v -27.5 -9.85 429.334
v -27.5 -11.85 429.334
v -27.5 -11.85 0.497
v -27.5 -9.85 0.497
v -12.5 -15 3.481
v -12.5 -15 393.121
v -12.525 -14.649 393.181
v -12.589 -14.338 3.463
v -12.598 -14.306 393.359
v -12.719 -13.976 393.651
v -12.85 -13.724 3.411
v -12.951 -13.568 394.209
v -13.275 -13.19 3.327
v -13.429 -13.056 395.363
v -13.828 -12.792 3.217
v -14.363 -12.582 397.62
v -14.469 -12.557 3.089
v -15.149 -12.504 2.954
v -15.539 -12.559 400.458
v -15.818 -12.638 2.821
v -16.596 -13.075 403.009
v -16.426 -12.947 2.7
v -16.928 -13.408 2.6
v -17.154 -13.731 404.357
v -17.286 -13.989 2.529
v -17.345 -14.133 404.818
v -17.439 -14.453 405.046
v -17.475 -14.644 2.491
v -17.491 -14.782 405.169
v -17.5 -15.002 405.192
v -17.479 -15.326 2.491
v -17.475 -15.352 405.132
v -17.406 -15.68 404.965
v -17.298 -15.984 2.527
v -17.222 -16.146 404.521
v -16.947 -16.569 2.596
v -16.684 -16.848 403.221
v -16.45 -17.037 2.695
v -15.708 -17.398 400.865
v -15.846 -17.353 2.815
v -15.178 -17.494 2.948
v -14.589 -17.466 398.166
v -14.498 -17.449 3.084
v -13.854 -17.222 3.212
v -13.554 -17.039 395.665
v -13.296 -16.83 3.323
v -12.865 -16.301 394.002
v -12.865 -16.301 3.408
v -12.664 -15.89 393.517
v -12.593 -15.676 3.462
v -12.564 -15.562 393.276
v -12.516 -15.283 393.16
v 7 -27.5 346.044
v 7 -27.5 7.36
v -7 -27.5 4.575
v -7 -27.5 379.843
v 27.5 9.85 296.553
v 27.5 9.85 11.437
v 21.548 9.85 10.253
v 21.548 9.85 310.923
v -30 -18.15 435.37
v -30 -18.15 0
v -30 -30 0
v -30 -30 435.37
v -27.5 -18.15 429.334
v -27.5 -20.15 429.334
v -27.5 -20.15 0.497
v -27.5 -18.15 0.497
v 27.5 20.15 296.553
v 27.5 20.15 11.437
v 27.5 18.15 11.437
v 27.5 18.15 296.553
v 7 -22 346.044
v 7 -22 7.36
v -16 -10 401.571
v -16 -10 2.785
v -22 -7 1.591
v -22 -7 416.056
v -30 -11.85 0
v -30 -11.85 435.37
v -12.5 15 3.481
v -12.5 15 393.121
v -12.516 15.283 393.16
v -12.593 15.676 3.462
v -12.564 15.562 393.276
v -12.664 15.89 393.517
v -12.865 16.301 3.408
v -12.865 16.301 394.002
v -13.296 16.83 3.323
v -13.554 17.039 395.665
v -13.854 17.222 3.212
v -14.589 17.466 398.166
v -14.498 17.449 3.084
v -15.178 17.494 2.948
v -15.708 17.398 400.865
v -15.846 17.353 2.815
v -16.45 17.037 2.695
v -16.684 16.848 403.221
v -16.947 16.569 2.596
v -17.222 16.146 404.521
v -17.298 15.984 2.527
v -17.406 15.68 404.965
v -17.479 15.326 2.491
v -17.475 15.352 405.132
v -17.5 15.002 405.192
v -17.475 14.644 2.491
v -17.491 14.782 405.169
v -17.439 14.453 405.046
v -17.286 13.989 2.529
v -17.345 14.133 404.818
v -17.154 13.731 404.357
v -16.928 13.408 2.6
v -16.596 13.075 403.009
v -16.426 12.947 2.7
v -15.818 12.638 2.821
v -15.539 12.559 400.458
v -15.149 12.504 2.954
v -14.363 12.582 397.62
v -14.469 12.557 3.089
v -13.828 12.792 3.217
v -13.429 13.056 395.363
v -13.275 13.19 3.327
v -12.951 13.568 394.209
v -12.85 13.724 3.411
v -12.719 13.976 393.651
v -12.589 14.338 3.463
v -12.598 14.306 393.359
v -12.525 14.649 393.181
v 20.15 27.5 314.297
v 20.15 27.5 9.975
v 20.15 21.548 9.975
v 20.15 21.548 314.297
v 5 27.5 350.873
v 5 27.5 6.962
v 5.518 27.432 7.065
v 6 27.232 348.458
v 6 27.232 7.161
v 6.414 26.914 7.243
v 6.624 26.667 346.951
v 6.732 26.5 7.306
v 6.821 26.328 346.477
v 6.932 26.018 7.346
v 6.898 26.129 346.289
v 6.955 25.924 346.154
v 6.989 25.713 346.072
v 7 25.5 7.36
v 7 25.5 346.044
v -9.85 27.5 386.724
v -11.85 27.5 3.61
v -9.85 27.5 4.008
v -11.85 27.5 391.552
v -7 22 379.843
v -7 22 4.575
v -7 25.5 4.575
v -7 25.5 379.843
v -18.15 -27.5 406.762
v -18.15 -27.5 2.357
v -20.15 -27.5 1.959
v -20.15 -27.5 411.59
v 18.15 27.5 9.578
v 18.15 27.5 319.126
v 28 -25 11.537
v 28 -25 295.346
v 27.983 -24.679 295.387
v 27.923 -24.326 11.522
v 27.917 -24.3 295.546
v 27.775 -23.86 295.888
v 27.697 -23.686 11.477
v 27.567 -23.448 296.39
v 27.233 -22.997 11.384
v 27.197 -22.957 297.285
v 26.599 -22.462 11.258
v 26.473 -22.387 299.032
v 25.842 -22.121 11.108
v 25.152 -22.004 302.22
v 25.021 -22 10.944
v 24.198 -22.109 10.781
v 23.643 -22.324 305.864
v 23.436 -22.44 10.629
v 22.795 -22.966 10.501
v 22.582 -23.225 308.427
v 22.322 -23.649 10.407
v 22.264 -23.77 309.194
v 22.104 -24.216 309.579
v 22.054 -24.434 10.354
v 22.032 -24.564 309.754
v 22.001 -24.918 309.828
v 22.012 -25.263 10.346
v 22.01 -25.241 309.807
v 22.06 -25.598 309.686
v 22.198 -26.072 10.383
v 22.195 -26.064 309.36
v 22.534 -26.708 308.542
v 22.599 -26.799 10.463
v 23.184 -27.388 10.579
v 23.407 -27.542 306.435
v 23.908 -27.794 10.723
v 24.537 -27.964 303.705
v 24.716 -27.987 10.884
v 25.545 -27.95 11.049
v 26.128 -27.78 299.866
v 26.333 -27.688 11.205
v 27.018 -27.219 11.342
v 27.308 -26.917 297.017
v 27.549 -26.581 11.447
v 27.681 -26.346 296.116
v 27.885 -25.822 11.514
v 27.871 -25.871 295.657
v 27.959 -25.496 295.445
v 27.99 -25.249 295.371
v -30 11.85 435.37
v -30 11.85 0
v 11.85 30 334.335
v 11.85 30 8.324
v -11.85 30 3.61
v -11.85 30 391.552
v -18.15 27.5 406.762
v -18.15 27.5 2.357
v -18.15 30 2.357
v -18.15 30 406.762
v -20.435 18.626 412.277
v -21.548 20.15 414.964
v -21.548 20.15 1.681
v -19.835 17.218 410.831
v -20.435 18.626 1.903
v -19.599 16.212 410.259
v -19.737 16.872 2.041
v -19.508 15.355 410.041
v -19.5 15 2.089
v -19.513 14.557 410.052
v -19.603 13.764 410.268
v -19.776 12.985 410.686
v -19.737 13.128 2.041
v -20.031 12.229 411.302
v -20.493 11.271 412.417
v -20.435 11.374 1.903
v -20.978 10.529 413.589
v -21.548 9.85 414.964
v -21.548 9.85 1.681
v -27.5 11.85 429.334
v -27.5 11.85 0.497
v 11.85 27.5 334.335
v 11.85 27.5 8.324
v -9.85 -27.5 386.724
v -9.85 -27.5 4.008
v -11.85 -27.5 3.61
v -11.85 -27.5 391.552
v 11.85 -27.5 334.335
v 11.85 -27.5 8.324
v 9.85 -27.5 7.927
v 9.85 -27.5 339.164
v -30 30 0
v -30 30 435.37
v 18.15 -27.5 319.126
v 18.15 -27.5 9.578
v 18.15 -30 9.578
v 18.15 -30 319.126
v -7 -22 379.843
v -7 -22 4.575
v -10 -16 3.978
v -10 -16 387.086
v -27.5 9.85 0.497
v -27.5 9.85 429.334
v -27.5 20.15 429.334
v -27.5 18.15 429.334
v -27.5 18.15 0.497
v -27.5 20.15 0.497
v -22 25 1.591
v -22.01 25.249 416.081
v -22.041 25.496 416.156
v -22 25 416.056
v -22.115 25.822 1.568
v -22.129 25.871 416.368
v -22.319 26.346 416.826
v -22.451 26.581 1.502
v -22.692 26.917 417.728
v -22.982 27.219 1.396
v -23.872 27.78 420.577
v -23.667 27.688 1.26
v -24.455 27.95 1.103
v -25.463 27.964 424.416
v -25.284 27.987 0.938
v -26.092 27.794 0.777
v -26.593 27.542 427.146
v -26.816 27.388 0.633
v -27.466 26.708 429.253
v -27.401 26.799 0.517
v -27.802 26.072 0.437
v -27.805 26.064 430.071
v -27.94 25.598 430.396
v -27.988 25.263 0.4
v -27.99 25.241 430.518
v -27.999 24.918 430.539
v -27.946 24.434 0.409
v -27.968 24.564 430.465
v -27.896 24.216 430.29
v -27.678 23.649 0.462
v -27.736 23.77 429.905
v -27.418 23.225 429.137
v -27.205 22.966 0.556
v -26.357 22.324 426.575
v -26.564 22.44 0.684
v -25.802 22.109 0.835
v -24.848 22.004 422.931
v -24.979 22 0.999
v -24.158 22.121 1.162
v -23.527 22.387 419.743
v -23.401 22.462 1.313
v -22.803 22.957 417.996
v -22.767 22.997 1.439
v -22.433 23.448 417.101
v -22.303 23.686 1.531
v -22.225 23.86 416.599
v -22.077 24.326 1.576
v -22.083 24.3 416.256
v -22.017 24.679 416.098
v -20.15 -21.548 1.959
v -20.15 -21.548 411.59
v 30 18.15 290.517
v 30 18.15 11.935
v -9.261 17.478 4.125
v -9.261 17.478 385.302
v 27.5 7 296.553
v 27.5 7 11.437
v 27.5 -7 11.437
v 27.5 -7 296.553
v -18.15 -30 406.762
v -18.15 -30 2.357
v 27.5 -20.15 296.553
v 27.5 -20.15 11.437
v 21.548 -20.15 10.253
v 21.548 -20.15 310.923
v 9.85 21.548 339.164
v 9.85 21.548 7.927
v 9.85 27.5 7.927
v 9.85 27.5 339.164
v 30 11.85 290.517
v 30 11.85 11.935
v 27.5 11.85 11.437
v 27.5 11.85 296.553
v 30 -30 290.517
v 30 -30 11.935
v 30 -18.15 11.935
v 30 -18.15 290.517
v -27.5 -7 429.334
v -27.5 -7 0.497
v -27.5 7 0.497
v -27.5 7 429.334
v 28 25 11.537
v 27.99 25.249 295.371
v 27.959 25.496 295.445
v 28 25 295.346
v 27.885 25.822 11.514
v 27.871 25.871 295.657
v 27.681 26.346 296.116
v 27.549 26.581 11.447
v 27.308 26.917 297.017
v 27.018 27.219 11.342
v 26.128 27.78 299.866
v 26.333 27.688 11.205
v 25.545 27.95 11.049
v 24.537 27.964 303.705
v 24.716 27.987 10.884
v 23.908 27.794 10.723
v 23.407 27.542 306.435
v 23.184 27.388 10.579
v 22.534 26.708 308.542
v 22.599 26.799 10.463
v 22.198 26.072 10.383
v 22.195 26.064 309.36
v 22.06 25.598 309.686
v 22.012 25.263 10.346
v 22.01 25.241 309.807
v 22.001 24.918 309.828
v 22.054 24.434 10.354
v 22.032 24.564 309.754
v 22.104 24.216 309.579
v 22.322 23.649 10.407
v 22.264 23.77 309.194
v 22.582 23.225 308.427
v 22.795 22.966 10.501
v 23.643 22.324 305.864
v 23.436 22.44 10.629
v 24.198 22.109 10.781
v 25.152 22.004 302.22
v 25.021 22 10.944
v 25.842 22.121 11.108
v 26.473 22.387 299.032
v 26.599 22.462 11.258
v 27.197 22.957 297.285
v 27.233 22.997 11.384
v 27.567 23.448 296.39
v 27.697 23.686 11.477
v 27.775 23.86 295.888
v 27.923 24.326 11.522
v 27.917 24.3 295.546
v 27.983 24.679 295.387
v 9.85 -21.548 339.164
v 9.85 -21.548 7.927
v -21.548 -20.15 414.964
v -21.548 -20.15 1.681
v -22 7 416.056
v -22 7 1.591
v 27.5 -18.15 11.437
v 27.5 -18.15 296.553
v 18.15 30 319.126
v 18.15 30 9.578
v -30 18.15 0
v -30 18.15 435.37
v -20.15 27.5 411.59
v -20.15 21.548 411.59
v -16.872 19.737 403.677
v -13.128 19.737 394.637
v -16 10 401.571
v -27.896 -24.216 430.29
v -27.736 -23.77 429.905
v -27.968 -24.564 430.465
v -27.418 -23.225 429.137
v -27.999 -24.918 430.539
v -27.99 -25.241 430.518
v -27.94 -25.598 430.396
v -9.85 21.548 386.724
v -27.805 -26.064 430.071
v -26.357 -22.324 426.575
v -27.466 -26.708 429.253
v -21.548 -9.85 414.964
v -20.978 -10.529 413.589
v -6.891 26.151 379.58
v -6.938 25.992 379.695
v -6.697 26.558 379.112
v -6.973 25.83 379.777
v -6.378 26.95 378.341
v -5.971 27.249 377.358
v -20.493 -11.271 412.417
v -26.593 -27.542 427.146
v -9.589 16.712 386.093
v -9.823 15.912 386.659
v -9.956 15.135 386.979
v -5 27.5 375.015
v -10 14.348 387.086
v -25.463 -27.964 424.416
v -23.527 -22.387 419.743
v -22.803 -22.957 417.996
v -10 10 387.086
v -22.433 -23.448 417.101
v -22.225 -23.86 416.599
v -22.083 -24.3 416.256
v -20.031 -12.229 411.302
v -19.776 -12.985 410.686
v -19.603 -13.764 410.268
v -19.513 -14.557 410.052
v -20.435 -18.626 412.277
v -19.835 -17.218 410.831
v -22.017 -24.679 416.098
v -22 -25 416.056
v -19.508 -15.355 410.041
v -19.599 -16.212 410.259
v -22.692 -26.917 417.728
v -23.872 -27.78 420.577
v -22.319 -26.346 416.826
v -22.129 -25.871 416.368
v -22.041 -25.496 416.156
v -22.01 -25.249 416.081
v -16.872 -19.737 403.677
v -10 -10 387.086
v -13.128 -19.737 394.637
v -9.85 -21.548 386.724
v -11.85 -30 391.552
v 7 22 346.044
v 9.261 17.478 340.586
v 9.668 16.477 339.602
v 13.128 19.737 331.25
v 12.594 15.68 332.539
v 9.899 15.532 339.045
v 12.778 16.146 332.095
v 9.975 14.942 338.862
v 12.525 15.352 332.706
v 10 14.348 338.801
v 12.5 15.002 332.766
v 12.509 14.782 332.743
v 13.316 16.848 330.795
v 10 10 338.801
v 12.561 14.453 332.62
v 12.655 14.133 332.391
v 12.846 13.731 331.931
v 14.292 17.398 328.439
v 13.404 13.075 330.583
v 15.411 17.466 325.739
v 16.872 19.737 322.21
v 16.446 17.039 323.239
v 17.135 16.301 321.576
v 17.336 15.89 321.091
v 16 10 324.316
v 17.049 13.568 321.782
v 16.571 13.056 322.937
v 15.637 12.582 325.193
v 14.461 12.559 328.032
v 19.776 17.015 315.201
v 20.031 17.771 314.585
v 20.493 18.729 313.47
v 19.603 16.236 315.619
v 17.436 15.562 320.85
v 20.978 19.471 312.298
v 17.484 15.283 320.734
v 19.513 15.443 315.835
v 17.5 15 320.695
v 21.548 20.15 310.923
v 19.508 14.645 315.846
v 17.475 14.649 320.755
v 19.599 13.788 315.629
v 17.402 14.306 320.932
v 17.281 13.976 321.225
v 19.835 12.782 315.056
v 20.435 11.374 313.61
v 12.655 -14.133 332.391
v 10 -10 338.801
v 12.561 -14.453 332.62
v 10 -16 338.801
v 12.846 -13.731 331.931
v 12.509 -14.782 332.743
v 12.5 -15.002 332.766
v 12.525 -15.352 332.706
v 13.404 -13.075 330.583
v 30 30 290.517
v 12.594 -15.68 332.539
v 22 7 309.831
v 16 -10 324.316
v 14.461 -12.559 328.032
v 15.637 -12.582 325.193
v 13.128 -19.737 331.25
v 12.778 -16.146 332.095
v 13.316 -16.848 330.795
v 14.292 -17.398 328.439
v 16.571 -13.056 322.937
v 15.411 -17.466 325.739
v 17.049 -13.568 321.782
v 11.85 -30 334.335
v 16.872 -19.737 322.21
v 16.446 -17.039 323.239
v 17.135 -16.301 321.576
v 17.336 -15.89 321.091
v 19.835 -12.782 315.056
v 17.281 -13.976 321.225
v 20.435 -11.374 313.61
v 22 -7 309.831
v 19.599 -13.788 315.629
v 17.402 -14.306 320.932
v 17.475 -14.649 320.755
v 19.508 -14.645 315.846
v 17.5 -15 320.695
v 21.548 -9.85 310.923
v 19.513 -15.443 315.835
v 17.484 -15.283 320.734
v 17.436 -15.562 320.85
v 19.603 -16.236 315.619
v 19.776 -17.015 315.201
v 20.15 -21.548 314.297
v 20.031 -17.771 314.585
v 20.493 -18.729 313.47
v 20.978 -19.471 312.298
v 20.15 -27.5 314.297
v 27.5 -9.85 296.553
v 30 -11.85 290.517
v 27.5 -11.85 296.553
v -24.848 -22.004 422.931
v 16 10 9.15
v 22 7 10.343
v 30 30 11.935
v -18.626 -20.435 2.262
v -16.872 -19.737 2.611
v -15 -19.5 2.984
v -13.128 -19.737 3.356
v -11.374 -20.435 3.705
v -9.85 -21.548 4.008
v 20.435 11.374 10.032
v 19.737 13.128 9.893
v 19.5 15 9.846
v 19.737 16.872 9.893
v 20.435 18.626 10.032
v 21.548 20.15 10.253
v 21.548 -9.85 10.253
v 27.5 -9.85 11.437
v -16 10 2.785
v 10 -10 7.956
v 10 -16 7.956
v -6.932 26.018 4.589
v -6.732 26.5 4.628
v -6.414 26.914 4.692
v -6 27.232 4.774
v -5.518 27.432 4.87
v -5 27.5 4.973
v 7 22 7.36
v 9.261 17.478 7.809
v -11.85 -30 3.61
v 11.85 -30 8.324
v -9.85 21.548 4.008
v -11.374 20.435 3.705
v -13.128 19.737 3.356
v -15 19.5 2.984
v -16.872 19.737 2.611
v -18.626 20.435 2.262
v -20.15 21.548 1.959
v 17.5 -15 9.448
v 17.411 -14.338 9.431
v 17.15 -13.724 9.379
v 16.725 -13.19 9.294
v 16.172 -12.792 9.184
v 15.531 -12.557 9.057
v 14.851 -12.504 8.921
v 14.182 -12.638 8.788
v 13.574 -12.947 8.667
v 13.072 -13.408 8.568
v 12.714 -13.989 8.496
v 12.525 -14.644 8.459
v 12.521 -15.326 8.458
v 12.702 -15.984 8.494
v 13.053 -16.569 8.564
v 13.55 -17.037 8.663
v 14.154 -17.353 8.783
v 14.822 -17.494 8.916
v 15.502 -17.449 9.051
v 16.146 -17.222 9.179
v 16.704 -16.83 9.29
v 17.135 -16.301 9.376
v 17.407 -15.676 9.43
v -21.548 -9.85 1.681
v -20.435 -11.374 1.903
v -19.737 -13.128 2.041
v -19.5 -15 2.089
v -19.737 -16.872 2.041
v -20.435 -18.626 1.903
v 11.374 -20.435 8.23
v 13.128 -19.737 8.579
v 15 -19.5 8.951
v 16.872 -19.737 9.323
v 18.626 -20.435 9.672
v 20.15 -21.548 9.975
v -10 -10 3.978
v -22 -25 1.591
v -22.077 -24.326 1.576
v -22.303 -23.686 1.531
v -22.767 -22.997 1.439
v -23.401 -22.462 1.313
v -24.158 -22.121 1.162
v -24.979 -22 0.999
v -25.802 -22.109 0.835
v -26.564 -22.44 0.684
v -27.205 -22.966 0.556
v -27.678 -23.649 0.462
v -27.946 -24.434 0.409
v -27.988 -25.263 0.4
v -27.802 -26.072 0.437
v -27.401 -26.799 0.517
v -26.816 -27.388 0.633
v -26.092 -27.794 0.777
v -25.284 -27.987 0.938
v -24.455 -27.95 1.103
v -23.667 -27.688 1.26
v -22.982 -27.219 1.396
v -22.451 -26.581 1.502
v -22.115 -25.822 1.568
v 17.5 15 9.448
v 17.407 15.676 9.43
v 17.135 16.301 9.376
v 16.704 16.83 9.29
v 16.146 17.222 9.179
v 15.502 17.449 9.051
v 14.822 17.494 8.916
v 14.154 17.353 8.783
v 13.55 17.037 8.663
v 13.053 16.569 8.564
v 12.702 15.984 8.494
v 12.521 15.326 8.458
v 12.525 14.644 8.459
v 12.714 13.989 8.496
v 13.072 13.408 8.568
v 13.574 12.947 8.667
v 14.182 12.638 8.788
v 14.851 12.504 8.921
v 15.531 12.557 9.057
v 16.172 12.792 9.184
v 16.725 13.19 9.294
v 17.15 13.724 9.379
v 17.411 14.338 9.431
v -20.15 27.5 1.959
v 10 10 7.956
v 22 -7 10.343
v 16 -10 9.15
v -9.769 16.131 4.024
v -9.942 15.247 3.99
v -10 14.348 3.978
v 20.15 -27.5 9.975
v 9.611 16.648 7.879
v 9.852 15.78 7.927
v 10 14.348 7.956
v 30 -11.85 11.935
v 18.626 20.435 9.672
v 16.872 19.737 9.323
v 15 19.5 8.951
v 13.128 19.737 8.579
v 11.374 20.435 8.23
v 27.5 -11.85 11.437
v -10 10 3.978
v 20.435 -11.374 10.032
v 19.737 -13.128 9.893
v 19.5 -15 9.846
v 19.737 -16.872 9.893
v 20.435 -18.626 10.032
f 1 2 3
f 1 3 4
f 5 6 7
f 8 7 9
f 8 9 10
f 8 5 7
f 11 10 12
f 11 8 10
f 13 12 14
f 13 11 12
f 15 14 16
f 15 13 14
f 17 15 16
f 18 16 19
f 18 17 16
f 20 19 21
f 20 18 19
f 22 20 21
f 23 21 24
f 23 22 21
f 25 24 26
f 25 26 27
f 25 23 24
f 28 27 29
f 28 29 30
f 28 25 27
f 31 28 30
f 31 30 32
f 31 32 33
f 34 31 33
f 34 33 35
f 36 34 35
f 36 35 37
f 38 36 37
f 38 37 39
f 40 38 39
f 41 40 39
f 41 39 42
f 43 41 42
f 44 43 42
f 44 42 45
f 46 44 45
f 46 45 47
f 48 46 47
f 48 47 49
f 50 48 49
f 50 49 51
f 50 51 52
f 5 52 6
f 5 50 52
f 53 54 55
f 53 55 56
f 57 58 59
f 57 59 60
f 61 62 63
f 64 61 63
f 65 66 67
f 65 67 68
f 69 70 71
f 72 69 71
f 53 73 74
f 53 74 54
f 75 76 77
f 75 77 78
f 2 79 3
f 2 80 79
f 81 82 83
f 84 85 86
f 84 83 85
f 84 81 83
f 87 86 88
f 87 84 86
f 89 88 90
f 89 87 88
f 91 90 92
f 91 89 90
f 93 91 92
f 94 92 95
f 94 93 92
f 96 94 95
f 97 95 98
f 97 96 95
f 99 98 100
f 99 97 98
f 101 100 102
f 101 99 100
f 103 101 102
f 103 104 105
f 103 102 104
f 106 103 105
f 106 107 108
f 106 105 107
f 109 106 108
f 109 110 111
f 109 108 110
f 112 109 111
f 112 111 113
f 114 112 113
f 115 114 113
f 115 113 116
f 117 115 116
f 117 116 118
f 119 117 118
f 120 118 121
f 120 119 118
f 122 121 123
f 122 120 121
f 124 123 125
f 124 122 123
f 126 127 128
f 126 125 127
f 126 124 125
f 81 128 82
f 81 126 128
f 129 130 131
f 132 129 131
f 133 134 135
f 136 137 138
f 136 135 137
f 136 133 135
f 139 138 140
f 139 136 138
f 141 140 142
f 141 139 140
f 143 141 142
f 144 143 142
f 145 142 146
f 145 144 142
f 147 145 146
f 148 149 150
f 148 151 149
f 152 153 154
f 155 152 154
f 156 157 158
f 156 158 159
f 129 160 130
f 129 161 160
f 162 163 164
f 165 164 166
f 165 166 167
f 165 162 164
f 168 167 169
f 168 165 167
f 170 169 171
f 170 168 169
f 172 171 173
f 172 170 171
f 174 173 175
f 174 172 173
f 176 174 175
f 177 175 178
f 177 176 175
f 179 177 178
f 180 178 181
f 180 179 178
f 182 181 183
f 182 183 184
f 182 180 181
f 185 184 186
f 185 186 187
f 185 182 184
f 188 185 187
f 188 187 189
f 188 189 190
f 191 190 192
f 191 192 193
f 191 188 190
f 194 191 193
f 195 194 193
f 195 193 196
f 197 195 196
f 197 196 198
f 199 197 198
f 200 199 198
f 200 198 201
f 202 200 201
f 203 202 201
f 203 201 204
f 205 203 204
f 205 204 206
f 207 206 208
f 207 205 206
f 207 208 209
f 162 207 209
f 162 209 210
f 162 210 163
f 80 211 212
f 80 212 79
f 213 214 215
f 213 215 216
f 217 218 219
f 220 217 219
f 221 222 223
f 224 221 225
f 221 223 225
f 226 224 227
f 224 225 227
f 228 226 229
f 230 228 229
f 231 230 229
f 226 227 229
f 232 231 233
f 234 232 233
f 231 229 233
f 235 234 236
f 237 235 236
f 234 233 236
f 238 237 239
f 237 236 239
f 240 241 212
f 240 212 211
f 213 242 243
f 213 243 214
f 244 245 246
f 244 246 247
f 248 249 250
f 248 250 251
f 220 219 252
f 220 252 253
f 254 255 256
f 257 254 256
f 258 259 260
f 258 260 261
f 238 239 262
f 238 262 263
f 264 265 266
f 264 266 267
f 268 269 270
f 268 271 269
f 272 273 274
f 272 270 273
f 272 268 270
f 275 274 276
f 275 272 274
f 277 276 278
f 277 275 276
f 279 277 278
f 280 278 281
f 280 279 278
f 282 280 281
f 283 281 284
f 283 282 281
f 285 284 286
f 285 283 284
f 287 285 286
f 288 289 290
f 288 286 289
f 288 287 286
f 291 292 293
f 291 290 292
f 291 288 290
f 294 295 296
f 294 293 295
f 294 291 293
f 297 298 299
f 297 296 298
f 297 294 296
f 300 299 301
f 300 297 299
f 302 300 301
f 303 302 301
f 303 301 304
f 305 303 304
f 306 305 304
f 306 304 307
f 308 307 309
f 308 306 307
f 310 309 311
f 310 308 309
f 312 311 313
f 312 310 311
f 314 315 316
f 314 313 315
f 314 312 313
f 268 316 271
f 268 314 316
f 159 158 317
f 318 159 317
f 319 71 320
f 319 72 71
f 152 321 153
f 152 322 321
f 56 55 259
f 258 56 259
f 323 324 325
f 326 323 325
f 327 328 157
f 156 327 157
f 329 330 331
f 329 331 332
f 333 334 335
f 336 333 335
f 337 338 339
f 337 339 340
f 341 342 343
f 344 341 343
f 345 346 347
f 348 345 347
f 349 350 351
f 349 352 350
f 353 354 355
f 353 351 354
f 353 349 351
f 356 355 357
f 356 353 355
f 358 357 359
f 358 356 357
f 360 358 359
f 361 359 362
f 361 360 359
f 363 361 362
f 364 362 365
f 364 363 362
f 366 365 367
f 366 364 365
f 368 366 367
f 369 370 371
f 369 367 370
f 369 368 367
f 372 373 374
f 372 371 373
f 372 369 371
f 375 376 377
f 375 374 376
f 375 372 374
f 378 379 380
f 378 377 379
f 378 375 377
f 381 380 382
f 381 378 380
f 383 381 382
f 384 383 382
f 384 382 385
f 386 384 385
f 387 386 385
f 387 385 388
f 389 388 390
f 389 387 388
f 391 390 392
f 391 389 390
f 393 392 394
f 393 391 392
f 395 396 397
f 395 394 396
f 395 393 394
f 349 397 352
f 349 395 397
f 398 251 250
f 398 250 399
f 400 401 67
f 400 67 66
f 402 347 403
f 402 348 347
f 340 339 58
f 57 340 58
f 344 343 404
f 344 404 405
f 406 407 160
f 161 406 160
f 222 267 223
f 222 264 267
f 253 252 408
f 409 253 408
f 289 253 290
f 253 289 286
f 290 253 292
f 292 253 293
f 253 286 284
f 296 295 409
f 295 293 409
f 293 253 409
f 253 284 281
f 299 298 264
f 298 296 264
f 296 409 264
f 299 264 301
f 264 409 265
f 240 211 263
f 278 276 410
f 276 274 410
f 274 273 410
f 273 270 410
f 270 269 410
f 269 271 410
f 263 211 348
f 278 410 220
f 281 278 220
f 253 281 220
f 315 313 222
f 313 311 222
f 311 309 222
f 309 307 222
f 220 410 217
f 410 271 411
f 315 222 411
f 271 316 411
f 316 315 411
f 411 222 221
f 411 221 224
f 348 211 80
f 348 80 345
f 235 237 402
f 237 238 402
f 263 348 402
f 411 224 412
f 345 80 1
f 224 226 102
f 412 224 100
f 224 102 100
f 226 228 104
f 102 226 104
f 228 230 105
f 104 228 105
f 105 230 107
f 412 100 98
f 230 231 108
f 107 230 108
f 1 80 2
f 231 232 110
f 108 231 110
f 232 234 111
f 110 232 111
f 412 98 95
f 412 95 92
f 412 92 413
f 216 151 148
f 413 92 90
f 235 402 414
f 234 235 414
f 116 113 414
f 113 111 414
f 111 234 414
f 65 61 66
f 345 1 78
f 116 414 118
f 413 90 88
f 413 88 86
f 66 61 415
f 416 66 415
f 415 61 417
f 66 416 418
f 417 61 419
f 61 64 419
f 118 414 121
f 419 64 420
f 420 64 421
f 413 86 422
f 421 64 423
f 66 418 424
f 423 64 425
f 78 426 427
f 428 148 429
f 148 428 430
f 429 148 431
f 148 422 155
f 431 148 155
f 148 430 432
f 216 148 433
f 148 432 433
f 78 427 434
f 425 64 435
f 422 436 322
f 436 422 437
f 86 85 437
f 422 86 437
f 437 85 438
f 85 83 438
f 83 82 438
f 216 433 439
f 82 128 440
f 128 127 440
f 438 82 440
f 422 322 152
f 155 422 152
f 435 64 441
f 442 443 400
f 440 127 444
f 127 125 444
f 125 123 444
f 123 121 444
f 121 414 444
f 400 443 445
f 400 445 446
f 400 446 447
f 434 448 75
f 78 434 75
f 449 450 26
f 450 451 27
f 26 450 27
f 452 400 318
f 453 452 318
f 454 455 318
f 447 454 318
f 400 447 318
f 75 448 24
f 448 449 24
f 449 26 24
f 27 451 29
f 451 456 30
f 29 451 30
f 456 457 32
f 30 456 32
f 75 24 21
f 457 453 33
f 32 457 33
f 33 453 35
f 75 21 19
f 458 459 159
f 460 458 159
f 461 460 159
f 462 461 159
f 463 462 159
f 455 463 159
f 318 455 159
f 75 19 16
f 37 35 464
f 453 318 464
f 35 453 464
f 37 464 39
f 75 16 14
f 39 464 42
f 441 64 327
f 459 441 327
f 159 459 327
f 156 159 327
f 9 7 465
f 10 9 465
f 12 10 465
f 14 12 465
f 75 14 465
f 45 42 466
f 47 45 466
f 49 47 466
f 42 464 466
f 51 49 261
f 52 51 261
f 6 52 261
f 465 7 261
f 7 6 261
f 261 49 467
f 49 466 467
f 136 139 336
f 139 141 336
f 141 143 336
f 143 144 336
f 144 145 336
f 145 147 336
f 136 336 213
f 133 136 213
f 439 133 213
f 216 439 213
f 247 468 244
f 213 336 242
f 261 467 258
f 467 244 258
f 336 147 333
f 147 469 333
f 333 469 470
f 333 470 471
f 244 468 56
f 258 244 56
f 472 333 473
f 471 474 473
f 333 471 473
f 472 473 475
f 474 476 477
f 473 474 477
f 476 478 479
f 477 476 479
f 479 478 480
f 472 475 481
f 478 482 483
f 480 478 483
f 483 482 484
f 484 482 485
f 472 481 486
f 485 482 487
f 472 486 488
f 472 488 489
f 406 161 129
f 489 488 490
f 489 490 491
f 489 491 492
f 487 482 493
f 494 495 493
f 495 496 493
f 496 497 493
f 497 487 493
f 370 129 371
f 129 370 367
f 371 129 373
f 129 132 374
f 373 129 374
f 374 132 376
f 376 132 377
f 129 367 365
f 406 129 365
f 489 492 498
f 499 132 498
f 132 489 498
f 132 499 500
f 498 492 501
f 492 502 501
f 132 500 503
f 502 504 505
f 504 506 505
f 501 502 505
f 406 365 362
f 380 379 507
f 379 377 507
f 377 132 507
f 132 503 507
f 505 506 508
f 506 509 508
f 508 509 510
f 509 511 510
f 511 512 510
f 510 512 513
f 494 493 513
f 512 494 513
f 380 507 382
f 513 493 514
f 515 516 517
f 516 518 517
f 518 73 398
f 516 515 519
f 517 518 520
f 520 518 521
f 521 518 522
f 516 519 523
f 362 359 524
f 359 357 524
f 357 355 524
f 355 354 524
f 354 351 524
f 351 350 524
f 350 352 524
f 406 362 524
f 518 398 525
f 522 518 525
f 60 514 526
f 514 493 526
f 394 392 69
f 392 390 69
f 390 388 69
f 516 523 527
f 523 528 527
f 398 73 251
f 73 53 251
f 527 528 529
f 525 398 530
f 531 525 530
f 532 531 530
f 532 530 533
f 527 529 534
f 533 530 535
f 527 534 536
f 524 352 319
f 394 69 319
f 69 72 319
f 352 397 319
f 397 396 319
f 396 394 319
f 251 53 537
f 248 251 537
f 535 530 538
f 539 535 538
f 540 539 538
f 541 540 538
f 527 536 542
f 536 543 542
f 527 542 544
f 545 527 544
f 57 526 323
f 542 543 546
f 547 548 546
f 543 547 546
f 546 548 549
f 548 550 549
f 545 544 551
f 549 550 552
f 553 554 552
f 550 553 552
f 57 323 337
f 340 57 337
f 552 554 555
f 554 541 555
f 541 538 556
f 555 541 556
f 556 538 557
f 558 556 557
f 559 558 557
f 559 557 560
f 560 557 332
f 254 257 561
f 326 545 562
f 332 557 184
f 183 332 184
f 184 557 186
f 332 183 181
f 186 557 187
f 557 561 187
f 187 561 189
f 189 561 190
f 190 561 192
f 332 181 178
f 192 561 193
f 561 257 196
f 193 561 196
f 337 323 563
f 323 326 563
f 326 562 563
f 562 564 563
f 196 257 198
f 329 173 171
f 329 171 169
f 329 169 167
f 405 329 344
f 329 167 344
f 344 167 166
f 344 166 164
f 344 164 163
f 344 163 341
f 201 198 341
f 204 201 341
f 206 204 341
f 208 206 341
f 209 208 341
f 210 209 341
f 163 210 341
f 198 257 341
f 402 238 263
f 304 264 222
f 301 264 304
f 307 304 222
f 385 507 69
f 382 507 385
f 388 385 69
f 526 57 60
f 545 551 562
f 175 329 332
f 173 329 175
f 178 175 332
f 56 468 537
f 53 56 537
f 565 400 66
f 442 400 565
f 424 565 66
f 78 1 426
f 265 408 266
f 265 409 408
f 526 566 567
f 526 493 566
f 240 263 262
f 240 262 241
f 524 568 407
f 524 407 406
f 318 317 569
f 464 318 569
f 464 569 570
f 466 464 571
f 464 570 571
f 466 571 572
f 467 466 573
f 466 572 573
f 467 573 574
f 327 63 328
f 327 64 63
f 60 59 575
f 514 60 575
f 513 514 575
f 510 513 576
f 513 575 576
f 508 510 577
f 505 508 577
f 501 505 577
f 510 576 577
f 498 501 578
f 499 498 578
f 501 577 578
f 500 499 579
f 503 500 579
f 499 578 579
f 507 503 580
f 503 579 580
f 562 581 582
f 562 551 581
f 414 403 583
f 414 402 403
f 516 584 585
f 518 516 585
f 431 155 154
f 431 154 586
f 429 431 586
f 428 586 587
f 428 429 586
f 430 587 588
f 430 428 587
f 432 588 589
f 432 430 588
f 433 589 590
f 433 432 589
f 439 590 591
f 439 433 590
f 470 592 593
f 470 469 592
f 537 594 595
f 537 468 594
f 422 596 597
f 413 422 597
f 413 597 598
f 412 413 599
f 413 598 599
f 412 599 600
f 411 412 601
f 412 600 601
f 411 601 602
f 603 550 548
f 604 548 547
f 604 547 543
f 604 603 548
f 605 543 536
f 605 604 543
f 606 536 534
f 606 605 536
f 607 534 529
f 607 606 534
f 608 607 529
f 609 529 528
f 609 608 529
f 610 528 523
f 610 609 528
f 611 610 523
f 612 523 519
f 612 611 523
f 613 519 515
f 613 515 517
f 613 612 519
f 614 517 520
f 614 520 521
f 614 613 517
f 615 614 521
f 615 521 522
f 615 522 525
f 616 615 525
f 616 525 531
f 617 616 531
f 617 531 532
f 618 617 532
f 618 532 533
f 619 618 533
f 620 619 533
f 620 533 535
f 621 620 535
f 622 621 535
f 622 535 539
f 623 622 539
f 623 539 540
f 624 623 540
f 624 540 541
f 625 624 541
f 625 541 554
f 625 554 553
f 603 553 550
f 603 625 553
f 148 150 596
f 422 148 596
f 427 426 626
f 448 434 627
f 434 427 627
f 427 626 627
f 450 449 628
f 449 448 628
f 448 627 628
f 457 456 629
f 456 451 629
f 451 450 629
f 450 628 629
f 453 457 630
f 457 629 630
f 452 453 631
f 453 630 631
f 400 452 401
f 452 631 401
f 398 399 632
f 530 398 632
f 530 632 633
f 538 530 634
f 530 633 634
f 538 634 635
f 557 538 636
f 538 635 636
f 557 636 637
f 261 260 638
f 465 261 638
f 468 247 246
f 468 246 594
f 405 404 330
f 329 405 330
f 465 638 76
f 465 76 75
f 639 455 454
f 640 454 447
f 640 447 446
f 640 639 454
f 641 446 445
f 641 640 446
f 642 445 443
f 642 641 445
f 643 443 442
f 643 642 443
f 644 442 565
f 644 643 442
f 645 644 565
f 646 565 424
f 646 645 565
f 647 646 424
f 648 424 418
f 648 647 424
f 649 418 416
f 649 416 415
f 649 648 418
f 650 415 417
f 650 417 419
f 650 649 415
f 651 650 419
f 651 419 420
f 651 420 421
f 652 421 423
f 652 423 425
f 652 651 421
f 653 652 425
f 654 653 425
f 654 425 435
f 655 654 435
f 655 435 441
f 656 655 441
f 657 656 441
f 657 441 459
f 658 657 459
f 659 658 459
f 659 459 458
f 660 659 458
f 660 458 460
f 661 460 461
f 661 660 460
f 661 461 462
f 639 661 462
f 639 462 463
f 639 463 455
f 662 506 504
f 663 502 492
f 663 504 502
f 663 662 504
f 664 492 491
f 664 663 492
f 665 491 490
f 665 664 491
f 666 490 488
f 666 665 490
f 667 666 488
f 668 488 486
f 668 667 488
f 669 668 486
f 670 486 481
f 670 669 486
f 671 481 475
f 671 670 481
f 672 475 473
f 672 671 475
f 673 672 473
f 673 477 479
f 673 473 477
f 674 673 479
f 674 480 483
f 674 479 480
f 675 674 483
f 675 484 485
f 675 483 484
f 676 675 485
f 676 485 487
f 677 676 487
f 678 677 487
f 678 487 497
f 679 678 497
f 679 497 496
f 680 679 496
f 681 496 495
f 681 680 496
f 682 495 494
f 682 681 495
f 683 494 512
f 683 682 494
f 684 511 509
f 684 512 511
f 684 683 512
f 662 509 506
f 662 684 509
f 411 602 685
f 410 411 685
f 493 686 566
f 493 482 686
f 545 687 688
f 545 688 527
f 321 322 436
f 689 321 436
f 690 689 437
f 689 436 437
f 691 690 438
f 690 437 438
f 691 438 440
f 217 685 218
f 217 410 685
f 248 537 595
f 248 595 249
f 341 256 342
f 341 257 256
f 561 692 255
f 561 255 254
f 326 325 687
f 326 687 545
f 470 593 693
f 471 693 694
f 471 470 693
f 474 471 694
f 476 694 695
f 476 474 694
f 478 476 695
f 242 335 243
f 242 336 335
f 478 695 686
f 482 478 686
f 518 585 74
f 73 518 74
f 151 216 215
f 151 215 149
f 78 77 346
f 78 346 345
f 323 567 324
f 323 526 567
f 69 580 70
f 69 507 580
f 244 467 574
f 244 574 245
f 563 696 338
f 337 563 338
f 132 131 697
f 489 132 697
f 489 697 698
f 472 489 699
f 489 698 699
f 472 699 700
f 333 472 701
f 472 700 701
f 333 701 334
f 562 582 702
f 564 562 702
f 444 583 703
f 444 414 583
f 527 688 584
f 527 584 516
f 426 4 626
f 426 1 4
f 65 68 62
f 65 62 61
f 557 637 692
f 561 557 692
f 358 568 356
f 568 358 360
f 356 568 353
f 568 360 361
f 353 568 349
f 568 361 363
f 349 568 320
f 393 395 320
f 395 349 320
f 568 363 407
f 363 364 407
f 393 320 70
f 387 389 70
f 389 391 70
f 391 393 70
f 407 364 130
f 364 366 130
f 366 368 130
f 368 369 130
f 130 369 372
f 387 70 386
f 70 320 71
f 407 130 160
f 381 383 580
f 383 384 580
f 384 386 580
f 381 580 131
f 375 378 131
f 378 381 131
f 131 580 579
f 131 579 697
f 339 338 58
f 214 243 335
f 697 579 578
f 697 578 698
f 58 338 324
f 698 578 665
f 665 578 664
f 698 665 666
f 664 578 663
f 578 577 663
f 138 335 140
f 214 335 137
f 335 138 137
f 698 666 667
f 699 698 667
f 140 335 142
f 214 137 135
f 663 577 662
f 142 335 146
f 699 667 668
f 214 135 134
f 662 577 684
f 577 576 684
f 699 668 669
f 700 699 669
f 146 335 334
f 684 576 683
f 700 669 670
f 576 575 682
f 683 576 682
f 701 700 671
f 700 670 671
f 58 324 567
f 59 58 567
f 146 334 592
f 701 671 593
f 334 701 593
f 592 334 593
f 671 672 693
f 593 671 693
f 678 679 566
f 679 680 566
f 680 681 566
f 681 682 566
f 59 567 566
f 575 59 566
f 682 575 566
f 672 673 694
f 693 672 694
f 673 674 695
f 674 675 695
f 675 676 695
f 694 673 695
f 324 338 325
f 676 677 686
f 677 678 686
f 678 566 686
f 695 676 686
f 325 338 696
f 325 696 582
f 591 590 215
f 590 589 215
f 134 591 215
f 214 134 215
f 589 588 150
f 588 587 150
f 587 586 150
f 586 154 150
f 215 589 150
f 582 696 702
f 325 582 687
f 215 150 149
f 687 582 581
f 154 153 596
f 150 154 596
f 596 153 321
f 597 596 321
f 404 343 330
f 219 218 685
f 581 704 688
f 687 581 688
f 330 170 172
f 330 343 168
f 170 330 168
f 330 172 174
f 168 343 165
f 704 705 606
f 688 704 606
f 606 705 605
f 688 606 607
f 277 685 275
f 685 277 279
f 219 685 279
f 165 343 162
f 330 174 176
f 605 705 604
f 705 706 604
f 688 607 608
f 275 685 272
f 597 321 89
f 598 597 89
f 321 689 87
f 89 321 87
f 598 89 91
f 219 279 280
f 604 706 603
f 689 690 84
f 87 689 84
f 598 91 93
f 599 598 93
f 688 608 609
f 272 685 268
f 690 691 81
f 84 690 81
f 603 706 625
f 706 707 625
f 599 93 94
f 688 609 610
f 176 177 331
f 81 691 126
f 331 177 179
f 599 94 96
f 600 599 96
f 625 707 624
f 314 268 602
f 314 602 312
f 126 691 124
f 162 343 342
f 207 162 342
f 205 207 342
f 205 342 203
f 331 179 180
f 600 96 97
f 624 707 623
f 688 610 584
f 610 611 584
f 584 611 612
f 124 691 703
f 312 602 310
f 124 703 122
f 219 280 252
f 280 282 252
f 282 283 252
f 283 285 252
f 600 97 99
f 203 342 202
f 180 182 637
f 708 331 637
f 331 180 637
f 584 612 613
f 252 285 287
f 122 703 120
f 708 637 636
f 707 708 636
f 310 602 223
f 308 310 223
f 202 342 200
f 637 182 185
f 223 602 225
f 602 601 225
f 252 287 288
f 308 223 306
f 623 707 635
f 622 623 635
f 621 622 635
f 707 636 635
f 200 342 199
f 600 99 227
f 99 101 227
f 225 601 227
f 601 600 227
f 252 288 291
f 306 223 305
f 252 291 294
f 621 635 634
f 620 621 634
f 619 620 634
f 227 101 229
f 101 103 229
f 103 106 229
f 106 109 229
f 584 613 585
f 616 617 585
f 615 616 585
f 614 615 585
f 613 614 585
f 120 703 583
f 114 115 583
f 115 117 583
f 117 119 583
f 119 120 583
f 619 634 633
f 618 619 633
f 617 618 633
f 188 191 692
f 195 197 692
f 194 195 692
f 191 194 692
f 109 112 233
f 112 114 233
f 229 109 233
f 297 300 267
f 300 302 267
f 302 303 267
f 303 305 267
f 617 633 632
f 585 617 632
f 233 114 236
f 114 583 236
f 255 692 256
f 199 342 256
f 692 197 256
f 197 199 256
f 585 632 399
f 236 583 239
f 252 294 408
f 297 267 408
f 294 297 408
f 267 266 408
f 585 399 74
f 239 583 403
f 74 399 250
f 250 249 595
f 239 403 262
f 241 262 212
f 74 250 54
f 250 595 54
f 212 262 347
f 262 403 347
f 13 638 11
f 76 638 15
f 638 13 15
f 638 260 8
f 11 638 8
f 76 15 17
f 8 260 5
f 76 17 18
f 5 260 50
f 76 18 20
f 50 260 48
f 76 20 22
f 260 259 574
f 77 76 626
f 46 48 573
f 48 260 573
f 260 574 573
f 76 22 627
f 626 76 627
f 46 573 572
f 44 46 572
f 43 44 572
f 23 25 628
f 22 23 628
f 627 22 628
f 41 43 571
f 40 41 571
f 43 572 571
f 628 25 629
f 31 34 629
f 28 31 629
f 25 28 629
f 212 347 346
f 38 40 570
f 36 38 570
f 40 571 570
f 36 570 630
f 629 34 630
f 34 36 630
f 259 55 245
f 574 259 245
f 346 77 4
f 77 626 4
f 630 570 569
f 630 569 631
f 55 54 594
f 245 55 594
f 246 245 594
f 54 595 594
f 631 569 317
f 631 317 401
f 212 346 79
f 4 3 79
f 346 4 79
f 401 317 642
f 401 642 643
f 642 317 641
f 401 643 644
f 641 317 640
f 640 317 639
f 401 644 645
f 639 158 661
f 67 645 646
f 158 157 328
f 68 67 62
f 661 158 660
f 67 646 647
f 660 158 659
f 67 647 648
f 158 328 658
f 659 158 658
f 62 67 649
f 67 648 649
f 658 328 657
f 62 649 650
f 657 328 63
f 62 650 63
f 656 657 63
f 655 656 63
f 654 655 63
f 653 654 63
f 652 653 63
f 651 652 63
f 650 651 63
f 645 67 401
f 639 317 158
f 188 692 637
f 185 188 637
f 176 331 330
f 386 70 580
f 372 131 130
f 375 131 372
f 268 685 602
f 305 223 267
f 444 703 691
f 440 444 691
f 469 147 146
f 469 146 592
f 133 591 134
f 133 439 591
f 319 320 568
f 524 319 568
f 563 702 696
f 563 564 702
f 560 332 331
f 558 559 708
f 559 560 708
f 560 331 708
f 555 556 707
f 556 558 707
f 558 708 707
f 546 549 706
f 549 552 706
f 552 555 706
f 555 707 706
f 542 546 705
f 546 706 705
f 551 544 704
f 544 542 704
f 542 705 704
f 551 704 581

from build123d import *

# Parameters (mm, degrees)
F0_R          = 3
F0_R_2        = 2.5
F1_DEPTH      = 435.37
F2_R          = 2
F3_R          = 7
F5_DEPTH      = 30
F5_DEPTH_BACK = 30


# Not quite as in the source:
# - a feature names something its author has since deleted; it is built from what else it names


with BuildPart() as f1:
    # F0 (on Top) → F1 (new body)
    with BuildSketch(Plane.XY):
        with BuildLine():
            Line((18.15, -30), (30, -30))
            Line((30, -30), (30, -18.15))
            Line((30, -18.15), (27.5, -18.15))
            Line((27.5, -18.15), (27.5, -20.15))
            Line((27.5, -20.15), (21.5477069044, -20.15))
            ThreePointArc((21.5477069044, -20.15), (19.5, -15), (21.5477069044, -9.85))
            Line((21.5477069044, -9.85), (27.5, -9.85))
            Line((27.5, -9.85), (27.5, -11.85))
            Line((27.5, -11.85), (30, -11.85))
            Line((30, -11.85), (30, 11.85))
            Line((30, 11.85), (27.5, 11.85))
            Line((27.5, 11.85), (27.5, 9.85))
            Line((27.5, 9.85), (21.5477069044, 9.85))
            ThreePointArc((21.5477069044, 9.85), (19.5, 15), (21.5477069044, 20.15))
            Line((21.5477069044, 20.15), (27.5, 20.15))
            Line((27.5, 20.15), (27.5, 18.15))
            Line((27.5, 18.15), (30, 18.15))
            Line((30, 18.15), (30, 30))
            Line((30, 30), (18.15, 30))
            Line((18.15, 30), (18.15, 27.5))
            Line((18.15, 27.5), (20.15, 27.5))
            Line((20.15, 27.5), (20.15, 21.5477069044))
            ThreePointArc((20.15, 21.5477069044), (15, 19.5), (9.85, 21.5477069044))
            Line((9.85, 21.5477069044), (9.85, 27.5))
            Line((9.85, 27.5), (11.85, 27.5))
            Line((11.85, 27.5), (11.85, 30))
            Line((11.85, 30), (-11.85, 30))
            Line((-11.85, 30), (-11.85, 27.5))
            Line((-11.85, 27.5), (-9.85, 27.5))
            Line((-9.85, 27.5), (-9.85, 21.5477069044))
            ThreePointArc((-9.85, 21.5477069044), (-15, 19.5), (-20.15, 21.5477069044))
            Line((-20.15, 21.5477069044), (-20.15, 27.5))
            Line((-20.15, 27.5), (-18.15, 27.5))
            Line((-18.15, 27.5), (-18.15, 30))
            Line((-18.15, 30), (-30, 30))
            Line((-30, 30), (-30, 18.15))
            Line((-30, 18.15), (-27.5, 18.15))
            Line((-27.5, 18.15), (-27.5, 20.15))
            Line((-27.5, 20.15), (-21.5477069044, 20.15))
            ThreePointArc((-21.5477069044, 20.15), (-19.5, 15), (-21.5477069044, 9.85))
            Line((-21.5477069044, 9.85), (-27.5, 9.85))
            Line((-27.5, 9.85), (-27.5, 11.85))
            Line((-27.5, 11.85), (-30, 11.85))
            Line((-30, 11.85), (-30, -11.85))
            Line((-30, -11.85), (-27.5, -11.85))
            Line((-27.5, -11.85), (-27.5, -9.85))
            Line((-27.5, -9.85), (-21.5477069044, -9.85))
            ThreePointArc((-21.5477069044, -9.85), (-19.5, -15), (-21.5477069044, -20.15))
            Line((-21.5477069044, -20.15), (-27.5, -20.15))
            Line((-27.5, -20.15), (-27.5, -18.15))
            Line((-27.5, -18.15), (-30, -18.15))
            Line((-30, -18.15), (-30, -30))
            Line((-30, -30), (-18.15, -30))
            Line((-18.15, -30), (-18.15, -27.5))
            Line((-18.15, -27.5), (-20.15, -27.5))
            Line((-20.15, -27.5), (-20.15, -21.5477069044))
            ThreePointArc((-20.15, -21.5477069044), (-15, -19.5), (-9.85, -21.5477069044))
            Line((-9.85, -21.5477069044), (-9.85, -27.5))
            Line((-9.85, -27.5), (-11.85, -27.5))
            Line((-11.85, -27.5), (-11.85, -30))
            Line((-11.85, -30), (11.85, -30))
            Line((11.85, -30), (11.85, -27.5))
            Line((11.85, -27.5), (9.85, -27.5))
            Line((9.85, -27.5), (9.85, -21.5477069044))
            ThreePointArc((9.85, -21.5477069044), (15, -19.5), (20.15, -21.5477069044))
            Line((20.15, -21.5477069044), (20.15, -27.5))
            Line((20.15, -27.5), (18.15, -27.5))
            Line((18.15, -27.5), (18.15, -30))
        make_face()
        with Locations((-25, -25)):
            Circle(F0_R, mode=Mode.SUBTRACT)
        with Locations((-15, -15)):
            Circle(F0_R_2, mode=Mode.SUBTRACT)
        with Locations((25, -25)):
            Circle(F0_R, mode=Mode.SUBTRACT)
        with Locations((15, -15)):
            Circle(F0_R_2, mode=Mode.SUBTRACT)
        with Locations((-25, 25)):
            Circle(F0_R, mode=Mode.SUBTRACT)
        with Locations((-15, 15)):
            Circle(F0_R_2, mode=Mode.SUBTRACT)
        Polygon((-7, 22), (-7, 27.5), (0, 27.5), (7, 27.5), (7, 22), (10, 16), (10, 10), (16, 10), (22, 7), (27.5, 7), (27.5, 0), (27.5, -7), (22, -7), (16, -10), (10, -10), (10, -16), (7, -22), (7, -27.5), (0, -27.5), (-7, -27.5), (-7, -22), (-10, -16), (-10, -10), (-16, -10), (-22, -7), (-27.5, -7), (-27.5, 0), (-27.5, 7), (-22, 7), (-16, 10), (-10, 10), (-10, 16), align=None, mode=Mode.SUBTRACT)
        with Locations((15, 15)):
            Circle(F0_R_2, mode=Mode.SUBTRACT)
        with Locations((25, 25)):
            Circle(F0_R, mode=Mode.SUBTRACT)
    extrude(amount=F1_DEPTH)

    # F2
    f2_edges = [f1.edges().sort_by_distance(p)[0] for p in [
        (-7, 27.5, 217.685),
        (7, 27.5, 217.685),
    ]]
    fillet(f2_edges, radius=F2_R)

    # F3
    f3_edges = [f1.edges().sort_by_distance(p)[0] for p in [
        (-10, 16, 217.685),
        (10, 16, 217.685),
    ]]
    fillet(f3_edges, radius=F3_R)

    # F4 (on Front) → F5 (cut, two sides)
    with BuildSketch(Plane.XZ) as f5_sk:
        Polygon((14.7787195251, -225.1178250754), (176.1292593185, -193.0232072271), (131.3505397934, 32.0946178483), (-30, 0), align=None)
        Polygon((207.062683369, 533.564578584), (-30, 435.37), (64.6696372736, 206.8172777492), (301.7323206426, 305.0118563332), align=None)
    extrude(amount=F5_DEPTH, mode=Mode.SUBTRACT)
    extrude(f5_sk.sketch, amount=-F5_DEPTH_BACK, mode=Mode.SUBTRACT)


solid = f1.part
